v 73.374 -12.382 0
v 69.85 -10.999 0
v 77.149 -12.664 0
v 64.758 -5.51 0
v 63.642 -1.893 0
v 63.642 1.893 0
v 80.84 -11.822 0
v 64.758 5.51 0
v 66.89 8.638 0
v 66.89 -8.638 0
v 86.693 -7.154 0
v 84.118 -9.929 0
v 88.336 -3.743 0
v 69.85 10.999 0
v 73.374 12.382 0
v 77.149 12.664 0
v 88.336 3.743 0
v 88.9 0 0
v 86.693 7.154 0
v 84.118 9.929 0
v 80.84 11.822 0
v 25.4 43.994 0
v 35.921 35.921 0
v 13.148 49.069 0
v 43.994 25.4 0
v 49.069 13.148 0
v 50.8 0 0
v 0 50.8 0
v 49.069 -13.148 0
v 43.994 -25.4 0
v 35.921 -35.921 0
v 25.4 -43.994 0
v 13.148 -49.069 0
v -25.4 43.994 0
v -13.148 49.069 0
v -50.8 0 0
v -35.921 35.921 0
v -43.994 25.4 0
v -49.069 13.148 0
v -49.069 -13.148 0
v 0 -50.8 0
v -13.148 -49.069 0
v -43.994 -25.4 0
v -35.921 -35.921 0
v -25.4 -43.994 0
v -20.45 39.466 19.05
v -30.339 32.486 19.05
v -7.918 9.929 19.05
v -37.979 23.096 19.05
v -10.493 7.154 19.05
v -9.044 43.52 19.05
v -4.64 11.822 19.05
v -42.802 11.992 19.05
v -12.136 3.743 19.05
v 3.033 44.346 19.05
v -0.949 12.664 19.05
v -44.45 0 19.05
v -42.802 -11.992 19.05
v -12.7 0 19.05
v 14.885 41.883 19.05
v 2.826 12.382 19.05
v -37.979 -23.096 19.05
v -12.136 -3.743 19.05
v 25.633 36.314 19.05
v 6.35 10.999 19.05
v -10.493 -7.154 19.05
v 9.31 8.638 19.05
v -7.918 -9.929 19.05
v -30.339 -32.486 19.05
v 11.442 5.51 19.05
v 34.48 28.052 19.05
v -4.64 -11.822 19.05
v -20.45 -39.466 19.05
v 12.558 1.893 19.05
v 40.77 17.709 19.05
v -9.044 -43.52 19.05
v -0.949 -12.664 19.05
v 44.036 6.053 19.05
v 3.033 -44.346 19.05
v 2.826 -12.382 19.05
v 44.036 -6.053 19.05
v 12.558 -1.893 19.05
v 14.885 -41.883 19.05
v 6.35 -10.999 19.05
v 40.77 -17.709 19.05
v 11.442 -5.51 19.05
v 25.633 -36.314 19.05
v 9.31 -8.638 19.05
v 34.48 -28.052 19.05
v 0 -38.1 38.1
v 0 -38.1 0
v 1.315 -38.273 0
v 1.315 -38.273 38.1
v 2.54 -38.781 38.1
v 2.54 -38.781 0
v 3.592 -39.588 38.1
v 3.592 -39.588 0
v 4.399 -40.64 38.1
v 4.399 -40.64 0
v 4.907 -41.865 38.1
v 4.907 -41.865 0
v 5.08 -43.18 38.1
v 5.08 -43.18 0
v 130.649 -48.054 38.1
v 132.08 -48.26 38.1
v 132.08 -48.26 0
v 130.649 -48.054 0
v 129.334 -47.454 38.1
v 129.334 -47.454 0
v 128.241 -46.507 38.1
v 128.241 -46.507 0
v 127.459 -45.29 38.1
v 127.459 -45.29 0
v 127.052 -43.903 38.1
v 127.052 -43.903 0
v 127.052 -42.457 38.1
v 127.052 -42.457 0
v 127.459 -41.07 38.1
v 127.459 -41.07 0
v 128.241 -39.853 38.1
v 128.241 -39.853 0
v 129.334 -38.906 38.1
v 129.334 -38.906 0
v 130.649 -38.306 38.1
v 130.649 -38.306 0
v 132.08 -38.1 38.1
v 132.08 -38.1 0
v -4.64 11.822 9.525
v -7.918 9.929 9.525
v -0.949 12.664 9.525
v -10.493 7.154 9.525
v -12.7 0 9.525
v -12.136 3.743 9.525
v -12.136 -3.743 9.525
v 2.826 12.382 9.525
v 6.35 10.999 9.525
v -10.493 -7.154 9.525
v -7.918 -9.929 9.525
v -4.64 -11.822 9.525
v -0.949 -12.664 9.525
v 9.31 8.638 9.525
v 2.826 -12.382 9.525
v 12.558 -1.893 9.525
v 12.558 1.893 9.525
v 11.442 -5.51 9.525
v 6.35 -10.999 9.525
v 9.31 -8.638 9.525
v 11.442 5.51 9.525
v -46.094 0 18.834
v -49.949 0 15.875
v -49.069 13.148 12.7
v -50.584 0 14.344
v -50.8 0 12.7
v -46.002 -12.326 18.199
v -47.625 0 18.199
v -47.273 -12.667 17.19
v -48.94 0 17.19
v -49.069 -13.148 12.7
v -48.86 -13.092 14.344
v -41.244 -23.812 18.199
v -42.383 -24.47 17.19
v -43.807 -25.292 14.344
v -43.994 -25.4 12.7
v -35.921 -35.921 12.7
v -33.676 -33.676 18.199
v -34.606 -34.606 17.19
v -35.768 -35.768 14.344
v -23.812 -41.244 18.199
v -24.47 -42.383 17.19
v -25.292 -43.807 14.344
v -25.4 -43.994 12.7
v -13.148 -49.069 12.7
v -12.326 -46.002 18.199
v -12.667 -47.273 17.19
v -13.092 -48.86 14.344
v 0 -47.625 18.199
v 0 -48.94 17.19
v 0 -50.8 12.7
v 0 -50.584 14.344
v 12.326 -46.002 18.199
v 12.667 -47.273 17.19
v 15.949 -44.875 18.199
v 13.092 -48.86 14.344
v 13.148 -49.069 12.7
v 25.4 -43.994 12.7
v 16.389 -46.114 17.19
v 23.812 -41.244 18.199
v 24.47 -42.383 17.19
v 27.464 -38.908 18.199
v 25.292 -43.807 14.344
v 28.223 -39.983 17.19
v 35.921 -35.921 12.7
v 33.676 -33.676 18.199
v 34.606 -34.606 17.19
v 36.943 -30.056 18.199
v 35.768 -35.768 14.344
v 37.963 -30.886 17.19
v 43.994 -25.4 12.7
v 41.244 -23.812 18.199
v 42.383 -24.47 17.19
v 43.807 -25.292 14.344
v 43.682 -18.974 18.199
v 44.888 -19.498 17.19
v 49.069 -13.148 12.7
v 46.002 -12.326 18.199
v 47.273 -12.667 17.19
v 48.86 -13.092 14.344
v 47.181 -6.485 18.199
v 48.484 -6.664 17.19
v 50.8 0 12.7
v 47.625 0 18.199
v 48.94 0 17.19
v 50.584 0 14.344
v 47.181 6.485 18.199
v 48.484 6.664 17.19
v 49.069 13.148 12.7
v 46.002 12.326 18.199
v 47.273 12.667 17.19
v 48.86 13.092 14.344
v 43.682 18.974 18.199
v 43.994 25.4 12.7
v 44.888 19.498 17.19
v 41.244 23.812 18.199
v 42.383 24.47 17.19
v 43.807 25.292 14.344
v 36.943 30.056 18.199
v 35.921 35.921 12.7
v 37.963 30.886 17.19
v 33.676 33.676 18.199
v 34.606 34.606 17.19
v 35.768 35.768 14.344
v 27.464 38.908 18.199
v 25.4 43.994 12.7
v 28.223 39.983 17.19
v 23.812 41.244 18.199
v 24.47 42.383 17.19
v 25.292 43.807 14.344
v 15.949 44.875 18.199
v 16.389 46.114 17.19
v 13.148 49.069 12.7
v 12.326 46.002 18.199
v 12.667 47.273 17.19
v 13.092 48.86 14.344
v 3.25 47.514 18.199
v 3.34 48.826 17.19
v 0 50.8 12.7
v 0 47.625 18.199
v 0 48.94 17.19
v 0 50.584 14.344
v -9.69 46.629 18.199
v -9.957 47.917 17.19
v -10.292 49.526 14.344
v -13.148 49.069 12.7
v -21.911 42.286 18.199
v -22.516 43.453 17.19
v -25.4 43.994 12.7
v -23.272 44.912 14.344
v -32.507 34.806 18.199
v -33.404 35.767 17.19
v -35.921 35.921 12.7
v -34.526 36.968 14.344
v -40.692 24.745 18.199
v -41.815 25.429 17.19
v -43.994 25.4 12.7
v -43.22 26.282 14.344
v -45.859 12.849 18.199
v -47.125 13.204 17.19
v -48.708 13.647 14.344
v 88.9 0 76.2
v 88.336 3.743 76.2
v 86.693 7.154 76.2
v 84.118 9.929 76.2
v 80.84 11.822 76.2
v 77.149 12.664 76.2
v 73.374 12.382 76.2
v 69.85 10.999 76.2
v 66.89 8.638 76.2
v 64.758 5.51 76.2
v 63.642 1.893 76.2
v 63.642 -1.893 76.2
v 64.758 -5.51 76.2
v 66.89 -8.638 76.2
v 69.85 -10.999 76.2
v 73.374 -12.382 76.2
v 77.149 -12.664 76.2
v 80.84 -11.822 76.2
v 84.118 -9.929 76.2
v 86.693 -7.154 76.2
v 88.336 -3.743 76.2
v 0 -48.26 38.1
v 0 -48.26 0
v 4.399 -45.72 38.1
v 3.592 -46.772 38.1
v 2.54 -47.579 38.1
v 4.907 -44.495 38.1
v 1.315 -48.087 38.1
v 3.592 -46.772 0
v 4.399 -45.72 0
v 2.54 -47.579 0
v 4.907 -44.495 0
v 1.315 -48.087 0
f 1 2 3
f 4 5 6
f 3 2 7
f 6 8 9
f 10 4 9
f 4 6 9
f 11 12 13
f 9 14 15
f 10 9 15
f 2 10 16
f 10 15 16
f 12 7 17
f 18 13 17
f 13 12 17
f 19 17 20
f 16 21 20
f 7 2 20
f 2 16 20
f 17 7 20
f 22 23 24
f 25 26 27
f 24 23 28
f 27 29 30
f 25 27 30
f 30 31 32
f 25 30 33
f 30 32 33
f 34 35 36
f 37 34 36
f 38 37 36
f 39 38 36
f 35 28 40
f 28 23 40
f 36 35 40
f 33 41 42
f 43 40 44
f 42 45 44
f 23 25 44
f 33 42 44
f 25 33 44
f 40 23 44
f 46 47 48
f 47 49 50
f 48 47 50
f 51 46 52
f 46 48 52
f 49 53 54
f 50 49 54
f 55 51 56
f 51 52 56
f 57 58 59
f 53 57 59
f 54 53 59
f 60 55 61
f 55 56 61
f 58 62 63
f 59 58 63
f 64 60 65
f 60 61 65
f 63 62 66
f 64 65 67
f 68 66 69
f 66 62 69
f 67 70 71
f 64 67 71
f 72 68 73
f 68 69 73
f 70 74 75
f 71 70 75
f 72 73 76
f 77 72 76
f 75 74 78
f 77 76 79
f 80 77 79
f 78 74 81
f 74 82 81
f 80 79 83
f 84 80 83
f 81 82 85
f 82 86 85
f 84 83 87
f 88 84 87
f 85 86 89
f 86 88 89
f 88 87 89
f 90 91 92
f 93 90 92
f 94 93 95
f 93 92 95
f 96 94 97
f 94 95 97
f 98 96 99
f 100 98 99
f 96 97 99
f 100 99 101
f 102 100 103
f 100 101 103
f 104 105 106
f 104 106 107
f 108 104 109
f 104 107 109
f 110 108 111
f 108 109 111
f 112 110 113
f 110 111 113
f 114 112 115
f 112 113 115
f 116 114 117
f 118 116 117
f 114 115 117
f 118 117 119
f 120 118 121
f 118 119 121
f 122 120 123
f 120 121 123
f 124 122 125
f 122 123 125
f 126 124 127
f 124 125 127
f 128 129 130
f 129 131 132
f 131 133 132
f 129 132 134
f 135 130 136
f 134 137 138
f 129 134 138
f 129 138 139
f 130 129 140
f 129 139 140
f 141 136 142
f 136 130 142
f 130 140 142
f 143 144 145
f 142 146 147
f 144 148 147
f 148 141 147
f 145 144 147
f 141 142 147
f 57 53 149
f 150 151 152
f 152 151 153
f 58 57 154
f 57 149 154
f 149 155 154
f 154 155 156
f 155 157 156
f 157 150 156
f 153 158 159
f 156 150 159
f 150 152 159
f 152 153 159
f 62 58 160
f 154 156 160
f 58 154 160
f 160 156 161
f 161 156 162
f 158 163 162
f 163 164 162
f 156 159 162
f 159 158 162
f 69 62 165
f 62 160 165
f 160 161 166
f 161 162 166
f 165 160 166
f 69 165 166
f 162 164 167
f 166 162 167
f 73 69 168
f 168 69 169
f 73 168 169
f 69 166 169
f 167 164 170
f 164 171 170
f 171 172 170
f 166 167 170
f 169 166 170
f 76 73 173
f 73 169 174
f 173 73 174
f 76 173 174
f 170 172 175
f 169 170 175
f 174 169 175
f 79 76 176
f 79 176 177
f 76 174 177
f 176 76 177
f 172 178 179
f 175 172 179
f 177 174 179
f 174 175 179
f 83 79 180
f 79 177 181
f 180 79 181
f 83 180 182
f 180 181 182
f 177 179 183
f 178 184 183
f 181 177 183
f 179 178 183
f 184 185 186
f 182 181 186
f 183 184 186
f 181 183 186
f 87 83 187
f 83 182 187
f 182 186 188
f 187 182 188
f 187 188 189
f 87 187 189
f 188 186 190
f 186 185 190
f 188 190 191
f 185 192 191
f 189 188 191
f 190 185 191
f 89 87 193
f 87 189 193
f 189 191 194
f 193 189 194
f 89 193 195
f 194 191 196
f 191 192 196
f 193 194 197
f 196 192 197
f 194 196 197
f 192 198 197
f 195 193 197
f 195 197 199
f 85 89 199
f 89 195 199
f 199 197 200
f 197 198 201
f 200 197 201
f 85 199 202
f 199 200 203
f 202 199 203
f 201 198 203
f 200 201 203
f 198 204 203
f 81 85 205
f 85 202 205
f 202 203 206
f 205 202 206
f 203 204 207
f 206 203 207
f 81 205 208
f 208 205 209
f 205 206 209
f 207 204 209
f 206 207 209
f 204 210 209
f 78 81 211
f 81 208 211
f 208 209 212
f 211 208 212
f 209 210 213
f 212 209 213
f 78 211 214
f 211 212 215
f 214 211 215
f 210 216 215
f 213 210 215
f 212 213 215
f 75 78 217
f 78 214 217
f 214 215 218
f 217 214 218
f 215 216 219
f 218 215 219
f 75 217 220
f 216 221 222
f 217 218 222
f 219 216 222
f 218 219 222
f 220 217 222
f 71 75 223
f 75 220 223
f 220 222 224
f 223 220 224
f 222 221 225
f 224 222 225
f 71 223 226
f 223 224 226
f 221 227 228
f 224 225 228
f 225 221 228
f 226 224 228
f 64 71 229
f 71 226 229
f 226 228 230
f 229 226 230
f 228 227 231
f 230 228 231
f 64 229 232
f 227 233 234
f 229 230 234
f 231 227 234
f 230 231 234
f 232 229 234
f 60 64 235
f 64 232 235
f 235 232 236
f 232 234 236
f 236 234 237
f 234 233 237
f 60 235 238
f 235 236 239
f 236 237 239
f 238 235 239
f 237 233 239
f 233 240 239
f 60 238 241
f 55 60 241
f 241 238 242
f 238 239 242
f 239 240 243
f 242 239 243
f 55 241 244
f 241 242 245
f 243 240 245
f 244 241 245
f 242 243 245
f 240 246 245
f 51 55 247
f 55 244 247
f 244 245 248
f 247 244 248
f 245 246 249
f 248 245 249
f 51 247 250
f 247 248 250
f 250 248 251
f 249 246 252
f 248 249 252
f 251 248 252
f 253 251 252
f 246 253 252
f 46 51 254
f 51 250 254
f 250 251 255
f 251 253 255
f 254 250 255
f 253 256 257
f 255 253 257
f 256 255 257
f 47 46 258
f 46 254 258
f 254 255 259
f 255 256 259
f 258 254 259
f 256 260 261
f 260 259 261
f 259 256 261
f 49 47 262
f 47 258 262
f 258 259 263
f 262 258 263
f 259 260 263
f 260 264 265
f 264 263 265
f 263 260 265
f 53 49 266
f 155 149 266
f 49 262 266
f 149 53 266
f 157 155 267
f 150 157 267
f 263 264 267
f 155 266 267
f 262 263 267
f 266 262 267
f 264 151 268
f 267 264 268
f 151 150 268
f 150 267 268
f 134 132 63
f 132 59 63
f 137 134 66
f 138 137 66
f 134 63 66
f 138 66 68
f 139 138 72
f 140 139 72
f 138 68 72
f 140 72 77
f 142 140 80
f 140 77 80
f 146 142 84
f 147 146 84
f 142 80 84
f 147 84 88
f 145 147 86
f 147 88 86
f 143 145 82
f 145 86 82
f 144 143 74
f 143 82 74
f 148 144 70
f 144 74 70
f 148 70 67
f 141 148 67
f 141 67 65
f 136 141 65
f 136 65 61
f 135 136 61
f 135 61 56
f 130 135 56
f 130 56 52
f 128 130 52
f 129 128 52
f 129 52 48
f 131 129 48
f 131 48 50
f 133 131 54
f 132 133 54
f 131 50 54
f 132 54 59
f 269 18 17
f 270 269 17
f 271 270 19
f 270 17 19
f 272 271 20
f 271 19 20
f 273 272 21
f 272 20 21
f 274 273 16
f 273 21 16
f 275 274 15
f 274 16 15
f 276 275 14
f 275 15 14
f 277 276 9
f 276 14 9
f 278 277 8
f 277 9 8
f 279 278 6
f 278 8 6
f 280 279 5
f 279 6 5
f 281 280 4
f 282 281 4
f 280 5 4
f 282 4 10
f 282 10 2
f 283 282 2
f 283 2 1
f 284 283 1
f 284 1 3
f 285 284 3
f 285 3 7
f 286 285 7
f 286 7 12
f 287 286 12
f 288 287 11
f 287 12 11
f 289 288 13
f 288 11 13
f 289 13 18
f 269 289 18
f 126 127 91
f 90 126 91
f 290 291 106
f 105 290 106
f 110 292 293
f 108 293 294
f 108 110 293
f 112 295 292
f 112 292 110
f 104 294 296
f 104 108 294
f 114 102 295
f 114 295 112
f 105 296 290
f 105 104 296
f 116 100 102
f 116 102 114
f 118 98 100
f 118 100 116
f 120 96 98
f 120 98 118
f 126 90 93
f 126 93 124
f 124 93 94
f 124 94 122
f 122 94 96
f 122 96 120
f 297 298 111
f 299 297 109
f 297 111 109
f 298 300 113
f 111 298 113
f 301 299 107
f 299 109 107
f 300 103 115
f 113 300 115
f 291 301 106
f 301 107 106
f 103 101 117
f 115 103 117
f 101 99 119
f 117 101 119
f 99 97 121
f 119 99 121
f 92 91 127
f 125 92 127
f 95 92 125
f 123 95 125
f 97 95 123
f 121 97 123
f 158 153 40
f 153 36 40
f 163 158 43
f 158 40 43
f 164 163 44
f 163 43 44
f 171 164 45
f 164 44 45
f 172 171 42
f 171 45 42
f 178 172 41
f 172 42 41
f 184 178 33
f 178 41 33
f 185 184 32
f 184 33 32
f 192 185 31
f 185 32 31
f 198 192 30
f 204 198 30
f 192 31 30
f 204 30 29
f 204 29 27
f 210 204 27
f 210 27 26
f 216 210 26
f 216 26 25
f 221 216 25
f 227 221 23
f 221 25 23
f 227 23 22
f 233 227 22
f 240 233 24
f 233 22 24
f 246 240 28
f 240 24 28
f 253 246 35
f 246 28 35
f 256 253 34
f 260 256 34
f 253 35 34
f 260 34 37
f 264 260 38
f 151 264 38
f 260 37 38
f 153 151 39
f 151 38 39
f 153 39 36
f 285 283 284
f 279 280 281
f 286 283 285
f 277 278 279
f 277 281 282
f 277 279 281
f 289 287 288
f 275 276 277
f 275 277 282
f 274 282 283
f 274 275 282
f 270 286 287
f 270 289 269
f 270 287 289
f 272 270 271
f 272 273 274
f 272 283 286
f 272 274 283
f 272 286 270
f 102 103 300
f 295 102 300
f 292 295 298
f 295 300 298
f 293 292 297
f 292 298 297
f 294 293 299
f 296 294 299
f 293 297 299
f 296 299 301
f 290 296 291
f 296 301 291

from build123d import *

# Parameters (mm, degrees)
F0_R     = 12.7
F1_DEPTH = 76.2
F5_DEPTH = 38.1


with BuildPart() as f1:
    # F0 (on Top) → F1 (new body)
    with BuildSketch(Plane.XY):
        Circle(F0_R)
    extrude(amount=F1_DEPTH)


with BuildPart() as f1_1:
    # F2: moved
    add(f1.part.moved(Location((76.2, 0, 0))))


with BuildPart() as f4:
    # F3 (on Front) → F4 (revolve)
    with BuildSketch(Plane.XZ):
        with BuildLine():
            Line((-50.8, 0), (0, 0))
            Line((0, 0), (0, 9.525))
            Line((0, 9.525), (-12.7, 9.525))
            Line((-12.7, 9.525), (-12.7, 19.05))
            Line((-12.7, 19.05), (-44.45, 19.05))
            ThreePointArc((-44.45, 19.05), (-48.940128, 17.190128), (-50.8, 12.7))
            Line((-50.8, 12.7), (-50.8, 0))
        make_face()
    revolve(axis=Axis((0, 0, 9.525), (0, 0, 1)))


with BuildPart() as f5:
    # F0 (on Top) → F5 (new body)
    with BuildSketch(Plane.XY):
        with BuildLine():
            ThreePointArc((5.08, -43.18), (3.592102, -46.772102), (0, -48.26))
            Line((0, -48.26), (132.08, -48.26))
            ThreePointArc((132.08, -48.26), (127, -43.18), (132.08, -38.1))
            Line((132.08, -38.1), (0, -38.1))
            ThreePointArc((0, -38.1), (3.592102, -39.587898), (5.08, -43.18))
        make_face()
    extrude(amount=F5_DEPTH)


solid = Compound([f1_1.part, f4.part, f5.part])
